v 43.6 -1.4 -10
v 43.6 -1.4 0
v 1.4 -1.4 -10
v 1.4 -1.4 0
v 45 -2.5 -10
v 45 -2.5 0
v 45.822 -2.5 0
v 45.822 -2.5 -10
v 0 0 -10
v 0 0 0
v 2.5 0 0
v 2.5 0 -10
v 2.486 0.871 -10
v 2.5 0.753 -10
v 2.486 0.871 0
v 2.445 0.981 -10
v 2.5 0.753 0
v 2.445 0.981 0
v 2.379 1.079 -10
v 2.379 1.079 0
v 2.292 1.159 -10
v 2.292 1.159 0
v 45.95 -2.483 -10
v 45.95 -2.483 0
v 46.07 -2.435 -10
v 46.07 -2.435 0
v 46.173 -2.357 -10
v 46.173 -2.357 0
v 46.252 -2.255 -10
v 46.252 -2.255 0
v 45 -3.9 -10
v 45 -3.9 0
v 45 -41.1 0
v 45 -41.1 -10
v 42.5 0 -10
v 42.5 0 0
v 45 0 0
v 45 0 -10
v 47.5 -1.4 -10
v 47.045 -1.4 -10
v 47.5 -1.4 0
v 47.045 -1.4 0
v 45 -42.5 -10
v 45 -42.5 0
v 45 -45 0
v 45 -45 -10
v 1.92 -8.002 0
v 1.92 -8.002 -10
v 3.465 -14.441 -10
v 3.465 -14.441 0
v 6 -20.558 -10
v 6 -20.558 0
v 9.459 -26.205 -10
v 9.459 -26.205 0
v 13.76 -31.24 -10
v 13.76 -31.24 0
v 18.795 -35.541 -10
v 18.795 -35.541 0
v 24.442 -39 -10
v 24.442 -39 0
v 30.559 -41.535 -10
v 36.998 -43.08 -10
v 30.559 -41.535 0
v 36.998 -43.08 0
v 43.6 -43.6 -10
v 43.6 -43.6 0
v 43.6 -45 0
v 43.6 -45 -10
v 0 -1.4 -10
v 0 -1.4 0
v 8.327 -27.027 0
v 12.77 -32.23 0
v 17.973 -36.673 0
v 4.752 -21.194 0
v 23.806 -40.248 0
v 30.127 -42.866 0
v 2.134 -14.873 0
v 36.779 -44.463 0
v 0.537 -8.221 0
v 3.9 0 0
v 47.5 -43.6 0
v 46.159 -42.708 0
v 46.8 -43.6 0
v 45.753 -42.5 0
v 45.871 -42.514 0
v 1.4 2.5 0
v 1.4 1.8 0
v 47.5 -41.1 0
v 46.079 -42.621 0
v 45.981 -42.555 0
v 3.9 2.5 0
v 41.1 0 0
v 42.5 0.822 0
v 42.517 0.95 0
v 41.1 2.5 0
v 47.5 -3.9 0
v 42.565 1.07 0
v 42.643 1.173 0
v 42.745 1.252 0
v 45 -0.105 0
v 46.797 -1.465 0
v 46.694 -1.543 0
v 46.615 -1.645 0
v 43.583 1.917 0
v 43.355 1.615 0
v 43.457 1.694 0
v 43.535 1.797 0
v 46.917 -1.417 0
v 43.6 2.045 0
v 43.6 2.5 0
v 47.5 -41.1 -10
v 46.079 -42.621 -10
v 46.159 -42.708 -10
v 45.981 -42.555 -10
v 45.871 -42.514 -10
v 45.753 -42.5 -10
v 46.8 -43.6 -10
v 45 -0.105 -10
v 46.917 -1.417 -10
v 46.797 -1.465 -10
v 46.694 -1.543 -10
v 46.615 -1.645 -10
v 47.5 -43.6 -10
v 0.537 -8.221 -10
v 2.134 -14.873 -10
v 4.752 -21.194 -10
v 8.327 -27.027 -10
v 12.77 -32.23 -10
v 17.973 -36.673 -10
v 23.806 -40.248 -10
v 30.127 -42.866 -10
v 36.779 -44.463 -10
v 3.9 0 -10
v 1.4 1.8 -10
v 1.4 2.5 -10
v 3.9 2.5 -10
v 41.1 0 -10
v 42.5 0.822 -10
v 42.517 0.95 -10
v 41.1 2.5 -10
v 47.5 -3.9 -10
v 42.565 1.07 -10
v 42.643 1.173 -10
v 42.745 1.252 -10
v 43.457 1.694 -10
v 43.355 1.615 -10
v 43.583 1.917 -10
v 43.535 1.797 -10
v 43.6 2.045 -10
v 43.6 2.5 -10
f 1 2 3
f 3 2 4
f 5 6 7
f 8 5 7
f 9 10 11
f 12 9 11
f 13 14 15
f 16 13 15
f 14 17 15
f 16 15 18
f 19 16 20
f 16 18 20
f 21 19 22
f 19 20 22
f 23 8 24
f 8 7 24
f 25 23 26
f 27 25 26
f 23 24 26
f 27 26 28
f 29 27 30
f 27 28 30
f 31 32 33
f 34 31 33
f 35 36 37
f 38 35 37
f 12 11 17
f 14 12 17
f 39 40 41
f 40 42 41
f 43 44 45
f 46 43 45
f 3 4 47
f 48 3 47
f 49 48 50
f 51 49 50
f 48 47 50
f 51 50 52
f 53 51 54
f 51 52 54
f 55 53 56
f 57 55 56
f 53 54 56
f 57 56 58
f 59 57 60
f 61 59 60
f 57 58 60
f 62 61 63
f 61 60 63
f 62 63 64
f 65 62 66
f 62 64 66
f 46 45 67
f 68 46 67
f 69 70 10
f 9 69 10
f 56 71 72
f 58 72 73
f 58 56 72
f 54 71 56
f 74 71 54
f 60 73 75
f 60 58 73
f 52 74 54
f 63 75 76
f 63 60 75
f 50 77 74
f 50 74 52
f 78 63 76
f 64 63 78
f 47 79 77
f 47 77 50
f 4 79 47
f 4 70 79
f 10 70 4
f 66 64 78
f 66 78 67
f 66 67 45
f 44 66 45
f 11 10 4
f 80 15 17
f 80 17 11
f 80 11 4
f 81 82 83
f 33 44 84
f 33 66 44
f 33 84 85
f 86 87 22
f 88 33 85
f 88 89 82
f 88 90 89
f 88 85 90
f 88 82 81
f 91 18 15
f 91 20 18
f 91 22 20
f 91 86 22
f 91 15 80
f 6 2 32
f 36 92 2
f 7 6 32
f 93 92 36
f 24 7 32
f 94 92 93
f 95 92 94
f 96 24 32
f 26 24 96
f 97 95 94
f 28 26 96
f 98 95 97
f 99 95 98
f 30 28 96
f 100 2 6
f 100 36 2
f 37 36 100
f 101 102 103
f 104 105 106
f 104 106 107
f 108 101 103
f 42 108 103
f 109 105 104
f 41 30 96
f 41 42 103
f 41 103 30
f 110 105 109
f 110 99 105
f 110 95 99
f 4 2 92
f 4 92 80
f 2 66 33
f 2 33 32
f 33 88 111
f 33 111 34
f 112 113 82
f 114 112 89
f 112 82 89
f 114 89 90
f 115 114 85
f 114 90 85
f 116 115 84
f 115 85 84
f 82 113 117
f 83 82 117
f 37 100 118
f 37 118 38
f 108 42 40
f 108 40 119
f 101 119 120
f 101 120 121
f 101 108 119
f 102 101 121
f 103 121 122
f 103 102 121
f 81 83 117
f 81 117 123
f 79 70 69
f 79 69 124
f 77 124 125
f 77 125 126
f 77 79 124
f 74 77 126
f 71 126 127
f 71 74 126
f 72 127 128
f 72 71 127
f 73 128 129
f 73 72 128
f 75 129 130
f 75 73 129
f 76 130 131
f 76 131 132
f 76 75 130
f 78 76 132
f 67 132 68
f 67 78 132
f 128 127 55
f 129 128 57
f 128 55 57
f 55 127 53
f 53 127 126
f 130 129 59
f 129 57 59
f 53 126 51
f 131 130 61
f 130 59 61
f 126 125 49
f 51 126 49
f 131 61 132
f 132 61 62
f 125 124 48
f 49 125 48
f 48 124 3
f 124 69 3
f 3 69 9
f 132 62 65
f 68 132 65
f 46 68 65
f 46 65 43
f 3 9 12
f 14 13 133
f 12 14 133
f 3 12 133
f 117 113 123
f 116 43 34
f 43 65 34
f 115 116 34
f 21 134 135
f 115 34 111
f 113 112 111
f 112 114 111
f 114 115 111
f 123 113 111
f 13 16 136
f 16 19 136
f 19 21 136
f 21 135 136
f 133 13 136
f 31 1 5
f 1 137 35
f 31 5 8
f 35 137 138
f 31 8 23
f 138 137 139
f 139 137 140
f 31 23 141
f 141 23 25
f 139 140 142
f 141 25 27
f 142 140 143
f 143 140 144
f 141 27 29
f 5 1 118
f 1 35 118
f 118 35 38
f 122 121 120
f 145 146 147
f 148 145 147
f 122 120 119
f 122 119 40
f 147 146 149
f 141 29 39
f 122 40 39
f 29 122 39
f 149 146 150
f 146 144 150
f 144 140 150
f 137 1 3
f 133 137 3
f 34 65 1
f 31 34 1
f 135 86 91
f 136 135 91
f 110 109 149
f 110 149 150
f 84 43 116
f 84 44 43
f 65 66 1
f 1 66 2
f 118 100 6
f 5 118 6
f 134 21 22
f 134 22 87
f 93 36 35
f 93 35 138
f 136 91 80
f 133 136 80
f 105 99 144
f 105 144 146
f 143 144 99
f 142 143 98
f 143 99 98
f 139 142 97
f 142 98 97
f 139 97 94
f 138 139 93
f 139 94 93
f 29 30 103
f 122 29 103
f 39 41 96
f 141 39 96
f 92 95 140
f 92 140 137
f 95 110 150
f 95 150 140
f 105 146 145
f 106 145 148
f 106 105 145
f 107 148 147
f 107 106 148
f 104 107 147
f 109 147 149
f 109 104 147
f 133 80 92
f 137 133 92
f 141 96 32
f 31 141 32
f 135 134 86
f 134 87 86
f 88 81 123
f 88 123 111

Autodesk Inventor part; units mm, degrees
ref_plane "YZ Plane" through (0, 0, 0) normal (1, 0, 0) x (0, 1, 0)
ref_plane "XZ Plane" through (0, 0, 0) normal (0, 1, 0) x (-1, 0, 0)
ref_plane "XY Plane" through (0, 0, 0) normal (0, 0, 1) x (1, 0, 0)
sketch "Boceto1" plane through (0, 0, 0) normal (0, 0, 1) x (1, 0, 0)
  line L0 (43.6, -1.4) -> (1.4, -1.4)
  line L1 (0, -1.4) -> (0, 0)
  line L2 (45, -45) -> (43.6, -45)
  line L3 (43.6, -43.6) -> (43.6, -1.4)
  arc A0 (1.4, -1.4) -> (43.6, -43.6) centre (43.6, -1.4) ccw
  arc A1 (0, -1.4) -> (43.6, -45) centre (43.6, -1.4) ccw
  line L4 (2.5, 0) -> (2.5, 0.7532)
  line L5 (2.2918, 1.1592) -> (1.4, 1.8)
  line L6 (1.4, 1.8) -> (1.4, 2.5)
  line L7 (1.4, 2.5) -> (3.9, 2.5)
  line L8 (3.9, 2.5) -> (3.9, 0)
  arc A2 (2.5, 0.7532) -> (2.2918, 1.1592) centre (2, 0.7532) ccw
  line L9 (0, 0) -> (2.5, 0)
  line L10 (42.5, 0) -> (42.5, 0.8223)
  line L11 (42.7447, 1.2522) -> (43.3553, 1.6147)
  line L12 (43.6, 2.0446) -> (43.6, 2.5)
  line L13 (43.6, 2.5) -> (41.1, 2.5)
  line L14 (41.1, 2.5) -> (41.1, 0)
  line L15 (3.9, 0) -> (41.1, 0)
  line L16 (42.5, 0) -> (45, 0)
  arc A3 (42.7447, 1.2522) -> (42.5, 0.8223) centre (43, 0.8223) ccw
  arc A4 (43.3553, 1.6147) -> (43.6, 2.0446) centre (43.1, 2.0446) ccw
  line L17 (45, -2.5) -> (45.8223, -2.5)
  line L18 (46.2522, -2.2553) -> (46.6147, -1.6447)
  line L19 (47.0446, -1.4) -> (47.5, -1.4)
  line L20 (47.5, -1.4) -> (47.5, -3.9)
  line L21 (47.5, -3.9) -> (45, -3.9)
  arc A5 (47.0446, -1.4) -> (46.6147, -1.6447) centre (47.0446, -1.9) ccw
  arc A6 (45.8223, -2.5) -> (46.2522, -2.2553) centre (45.8223, -2) ccw
  line L22 (45, -42.5) -> (45.7532, -42.5)
  line L23 (46.1592, -42.7082) -> (46.8, -43.6)
  line L24 (46.8, -43.6) -> (47.5, -43.6)
  line L25 (47.5, -43.6) -> (47.5, -41.1)
  line L26 (47.5, -41.1) -> (45, -41.1)
  arc A7 (46.1592, -42.7082) -> (45.7532, -42.5) centre (45.7532, -43) ccw
  line L27 (45, -0.1052) -> (45, -2.5)
  line L28 (45, -2.5) -> (45, 0)
  line L29 (45, -3.9) -> (45, -41.1)
  line L30 (45, -42.5) -> (45, -45)
  line L31 (45, -45) -> (45, -42.5)
  line L32 (45, -41.1) -> (45, -3.9)
  point P0 (43.6, 1.76)
  point P1 (46.76, -1.4)
  dimension "d11" = 42.2
  dimension "d12" = 1.4
  dimension "d18" = 1.4
  dimension "d19" = 2.5
  dimension "d21" = 2.5
  dimension "d25" = 35.7
  dimension "d26" = 1.4
  dimension "d28" = 1.4
  dimension "d29" = 0.74
  dimension "d30" = 2.5
  dimension "d31" = 30.7
  dimension "d32" = 2.5
  dimension "d34" = 0.5
  dimension "d35" = 0.7
  dimension "d36" = 0.5
  dimension "d37" = 0.5
  dimension "d38" = 1.4
  dimension "d39" = 2.5
  dimension "d41" = 2.5
  dimension "d42" = 0.74
  dimension "d43" = 30.7
  dimension "d44" = 0.5
  dimension "d45" = 45
  dimension "d46" = 1.4
  dimension "d47" = 2.5
  dimension "d49" = 0.7
  dimension "d50" = 35.7
  dimension "d51" = 2.5
  dimension "d52" = 0.5
  dimension "d55" = 1.4
  dimension "d57" = 2.5
  dimension "d58" = 45
  dimension "d59" = 2.5
  dimension "d63" = 2.5
  dimension "d64" = 2.5
extrude "Extrusión1" add sketch "Boceto1" against normal blind 10
properties part number "SP40-15 PERFIL ESQUINERO PUNTAS INVERTIDAS" material "Aluminio"
